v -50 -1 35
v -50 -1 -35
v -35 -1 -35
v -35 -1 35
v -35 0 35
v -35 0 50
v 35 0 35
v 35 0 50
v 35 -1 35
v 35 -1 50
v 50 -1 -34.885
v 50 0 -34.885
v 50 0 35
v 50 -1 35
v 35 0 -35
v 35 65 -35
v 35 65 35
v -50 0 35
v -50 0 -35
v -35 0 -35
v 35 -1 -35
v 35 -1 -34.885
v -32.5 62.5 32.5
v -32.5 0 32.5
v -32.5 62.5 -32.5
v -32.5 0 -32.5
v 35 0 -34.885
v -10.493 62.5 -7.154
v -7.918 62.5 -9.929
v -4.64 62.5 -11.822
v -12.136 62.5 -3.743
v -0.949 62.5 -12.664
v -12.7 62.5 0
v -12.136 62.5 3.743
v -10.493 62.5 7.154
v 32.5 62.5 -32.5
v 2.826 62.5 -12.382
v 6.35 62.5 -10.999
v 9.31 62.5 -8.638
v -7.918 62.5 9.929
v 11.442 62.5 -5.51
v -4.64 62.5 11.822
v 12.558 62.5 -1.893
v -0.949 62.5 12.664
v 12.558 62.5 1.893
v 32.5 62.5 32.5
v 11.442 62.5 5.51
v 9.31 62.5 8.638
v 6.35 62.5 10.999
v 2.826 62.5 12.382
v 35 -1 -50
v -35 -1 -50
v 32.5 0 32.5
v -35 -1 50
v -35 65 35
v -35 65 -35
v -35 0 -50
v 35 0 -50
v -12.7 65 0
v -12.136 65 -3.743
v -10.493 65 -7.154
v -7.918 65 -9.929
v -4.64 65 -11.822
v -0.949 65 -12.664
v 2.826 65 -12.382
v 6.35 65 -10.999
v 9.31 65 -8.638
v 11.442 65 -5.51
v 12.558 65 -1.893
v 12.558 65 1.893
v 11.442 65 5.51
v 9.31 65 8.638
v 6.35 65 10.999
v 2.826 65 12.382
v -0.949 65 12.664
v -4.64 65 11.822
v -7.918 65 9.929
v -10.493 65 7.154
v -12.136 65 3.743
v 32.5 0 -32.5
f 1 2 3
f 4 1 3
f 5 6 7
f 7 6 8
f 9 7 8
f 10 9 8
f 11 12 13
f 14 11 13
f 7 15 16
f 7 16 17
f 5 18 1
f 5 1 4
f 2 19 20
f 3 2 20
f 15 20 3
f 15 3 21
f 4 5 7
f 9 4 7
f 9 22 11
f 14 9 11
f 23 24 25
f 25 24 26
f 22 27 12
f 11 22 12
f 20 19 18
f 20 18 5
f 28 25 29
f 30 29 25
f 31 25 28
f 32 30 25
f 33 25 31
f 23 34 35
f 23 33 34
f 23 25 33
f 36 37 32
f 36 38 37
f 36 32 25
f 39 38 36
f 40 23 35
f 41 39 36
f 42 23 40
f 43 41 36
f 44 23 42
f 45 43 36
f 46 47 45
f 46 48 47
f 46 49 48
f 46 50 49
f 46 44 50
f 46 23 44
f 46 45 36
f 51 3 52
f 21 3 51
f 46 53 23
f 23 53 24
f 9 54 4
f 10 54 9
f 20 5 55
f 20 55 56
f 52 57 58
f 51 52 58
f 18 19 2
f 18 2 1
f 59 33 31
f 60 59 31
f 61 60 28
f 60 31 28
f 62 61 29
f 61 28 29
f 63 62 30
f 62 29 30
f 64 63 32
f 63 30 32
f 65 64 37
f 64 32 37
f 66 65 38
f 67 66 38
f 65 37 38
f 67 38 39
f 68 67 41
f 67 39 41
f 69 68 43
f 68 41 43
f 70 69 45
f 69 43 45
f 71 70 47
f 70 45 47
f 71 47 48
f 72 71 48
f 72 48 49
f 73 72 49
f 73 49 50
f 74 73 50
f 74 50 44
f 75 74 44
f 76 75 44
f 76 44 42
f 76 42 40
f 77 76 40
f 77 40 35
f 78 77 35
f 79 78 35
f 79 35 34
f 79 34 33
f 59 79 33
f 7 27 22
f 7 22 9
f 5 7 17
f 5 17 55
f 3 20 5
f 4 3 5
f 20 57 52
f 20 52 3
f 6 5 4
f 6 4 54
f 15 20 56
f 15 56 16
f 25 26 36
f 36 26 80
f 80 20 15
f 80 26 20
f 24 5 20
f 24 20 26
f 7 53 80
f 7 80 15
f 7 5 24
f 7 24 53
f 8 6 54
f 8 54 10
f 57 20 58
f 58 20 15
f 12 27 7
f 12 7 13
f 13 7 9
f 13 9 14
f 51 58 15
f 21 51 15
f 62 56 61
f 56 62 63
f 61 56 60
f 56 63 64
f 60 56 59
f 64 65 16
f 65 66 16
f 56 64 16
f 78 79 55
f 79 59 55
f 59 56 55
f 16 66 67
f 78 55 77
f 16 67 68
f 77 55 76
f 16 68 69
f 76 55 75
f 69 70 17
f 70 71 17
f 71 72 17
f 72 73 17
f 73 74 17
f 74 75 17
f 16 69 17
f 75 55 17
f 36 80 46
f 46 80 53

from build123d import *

# Parameters (mm, degrees)
F3_DEPTH = 65
F0_W     = 15
F0_H     = 70
F4_DEPTH = 1
F0_W_2   = 70
F0_H_2   = 15
F0_H_3   = 69.884698689
F5_T     = -2.5
F6_D     = 25.4


with BuildPart() as f3:
    # F0 (on Front) → F3 (new body, through all)
    with BuildSketch(Plane.XZ):
        Polygon((-35, -35), (35, -35), (35, -34.884698689), (35, 35), (-35, 35), align=None)
    extrude(amount=-F3_DEPTH)

    # F5
    f5_openings = [f3.faces().sort_by_distance(p)[0] for p in [
        (0, 0, 0),
    ]]
    offset(amount=F5_T, openings=f5_openings)

    # F6 (through all)
    with Locations(Plane(origin=(0, 65, 0), x_dir=(1, 0, 0), z_dir=(0, 1, 0))):
        with Locations((0, 0)):
            Hole(F6_D / 2)


with BuildPart() as f4:
    # F0 (on Front) → F4 (new body)
    with BuildSketch(Plane.XZ):
        with Locations((-42.5, 0)):
            Rectangle(F0_W, F0_H)
    extrude(amount=F4_DEPTH)


with BuildPart() as f4b:
    # F0 (on Front) → F4, piece 2 (new body)
    with BuildSketch(Plane.XZ):
        with Locations((0, 42.5)):
            Rectangle(F0_W_2, F0_H_2)
    extrude(amount=F4_DEPTH)


with BuildPart() as f4c:
    # F0 (on Front) → F4, piece 3 (new body)
    with BuildSketch(Plane.XZ):
        with Locations((42.5, 0.0576506555)):
            Rectangle(F0_W, F0_H_3)
    extrude(amount=F4_DEPTH)


with BuildPart() as f4d:
    # F0 (on Front) → F4, piece 4 (new body)
    with BuildSketch(Plane.XZ):
        with Locations((0, -42.5)):
            Rectangle(F0_W_2, F0_H_2)
    extrude(amount=F4_DEPTH)


solid = Compound([f3.part, f4.part, f4b.part, f4c.part, f4d.part])
